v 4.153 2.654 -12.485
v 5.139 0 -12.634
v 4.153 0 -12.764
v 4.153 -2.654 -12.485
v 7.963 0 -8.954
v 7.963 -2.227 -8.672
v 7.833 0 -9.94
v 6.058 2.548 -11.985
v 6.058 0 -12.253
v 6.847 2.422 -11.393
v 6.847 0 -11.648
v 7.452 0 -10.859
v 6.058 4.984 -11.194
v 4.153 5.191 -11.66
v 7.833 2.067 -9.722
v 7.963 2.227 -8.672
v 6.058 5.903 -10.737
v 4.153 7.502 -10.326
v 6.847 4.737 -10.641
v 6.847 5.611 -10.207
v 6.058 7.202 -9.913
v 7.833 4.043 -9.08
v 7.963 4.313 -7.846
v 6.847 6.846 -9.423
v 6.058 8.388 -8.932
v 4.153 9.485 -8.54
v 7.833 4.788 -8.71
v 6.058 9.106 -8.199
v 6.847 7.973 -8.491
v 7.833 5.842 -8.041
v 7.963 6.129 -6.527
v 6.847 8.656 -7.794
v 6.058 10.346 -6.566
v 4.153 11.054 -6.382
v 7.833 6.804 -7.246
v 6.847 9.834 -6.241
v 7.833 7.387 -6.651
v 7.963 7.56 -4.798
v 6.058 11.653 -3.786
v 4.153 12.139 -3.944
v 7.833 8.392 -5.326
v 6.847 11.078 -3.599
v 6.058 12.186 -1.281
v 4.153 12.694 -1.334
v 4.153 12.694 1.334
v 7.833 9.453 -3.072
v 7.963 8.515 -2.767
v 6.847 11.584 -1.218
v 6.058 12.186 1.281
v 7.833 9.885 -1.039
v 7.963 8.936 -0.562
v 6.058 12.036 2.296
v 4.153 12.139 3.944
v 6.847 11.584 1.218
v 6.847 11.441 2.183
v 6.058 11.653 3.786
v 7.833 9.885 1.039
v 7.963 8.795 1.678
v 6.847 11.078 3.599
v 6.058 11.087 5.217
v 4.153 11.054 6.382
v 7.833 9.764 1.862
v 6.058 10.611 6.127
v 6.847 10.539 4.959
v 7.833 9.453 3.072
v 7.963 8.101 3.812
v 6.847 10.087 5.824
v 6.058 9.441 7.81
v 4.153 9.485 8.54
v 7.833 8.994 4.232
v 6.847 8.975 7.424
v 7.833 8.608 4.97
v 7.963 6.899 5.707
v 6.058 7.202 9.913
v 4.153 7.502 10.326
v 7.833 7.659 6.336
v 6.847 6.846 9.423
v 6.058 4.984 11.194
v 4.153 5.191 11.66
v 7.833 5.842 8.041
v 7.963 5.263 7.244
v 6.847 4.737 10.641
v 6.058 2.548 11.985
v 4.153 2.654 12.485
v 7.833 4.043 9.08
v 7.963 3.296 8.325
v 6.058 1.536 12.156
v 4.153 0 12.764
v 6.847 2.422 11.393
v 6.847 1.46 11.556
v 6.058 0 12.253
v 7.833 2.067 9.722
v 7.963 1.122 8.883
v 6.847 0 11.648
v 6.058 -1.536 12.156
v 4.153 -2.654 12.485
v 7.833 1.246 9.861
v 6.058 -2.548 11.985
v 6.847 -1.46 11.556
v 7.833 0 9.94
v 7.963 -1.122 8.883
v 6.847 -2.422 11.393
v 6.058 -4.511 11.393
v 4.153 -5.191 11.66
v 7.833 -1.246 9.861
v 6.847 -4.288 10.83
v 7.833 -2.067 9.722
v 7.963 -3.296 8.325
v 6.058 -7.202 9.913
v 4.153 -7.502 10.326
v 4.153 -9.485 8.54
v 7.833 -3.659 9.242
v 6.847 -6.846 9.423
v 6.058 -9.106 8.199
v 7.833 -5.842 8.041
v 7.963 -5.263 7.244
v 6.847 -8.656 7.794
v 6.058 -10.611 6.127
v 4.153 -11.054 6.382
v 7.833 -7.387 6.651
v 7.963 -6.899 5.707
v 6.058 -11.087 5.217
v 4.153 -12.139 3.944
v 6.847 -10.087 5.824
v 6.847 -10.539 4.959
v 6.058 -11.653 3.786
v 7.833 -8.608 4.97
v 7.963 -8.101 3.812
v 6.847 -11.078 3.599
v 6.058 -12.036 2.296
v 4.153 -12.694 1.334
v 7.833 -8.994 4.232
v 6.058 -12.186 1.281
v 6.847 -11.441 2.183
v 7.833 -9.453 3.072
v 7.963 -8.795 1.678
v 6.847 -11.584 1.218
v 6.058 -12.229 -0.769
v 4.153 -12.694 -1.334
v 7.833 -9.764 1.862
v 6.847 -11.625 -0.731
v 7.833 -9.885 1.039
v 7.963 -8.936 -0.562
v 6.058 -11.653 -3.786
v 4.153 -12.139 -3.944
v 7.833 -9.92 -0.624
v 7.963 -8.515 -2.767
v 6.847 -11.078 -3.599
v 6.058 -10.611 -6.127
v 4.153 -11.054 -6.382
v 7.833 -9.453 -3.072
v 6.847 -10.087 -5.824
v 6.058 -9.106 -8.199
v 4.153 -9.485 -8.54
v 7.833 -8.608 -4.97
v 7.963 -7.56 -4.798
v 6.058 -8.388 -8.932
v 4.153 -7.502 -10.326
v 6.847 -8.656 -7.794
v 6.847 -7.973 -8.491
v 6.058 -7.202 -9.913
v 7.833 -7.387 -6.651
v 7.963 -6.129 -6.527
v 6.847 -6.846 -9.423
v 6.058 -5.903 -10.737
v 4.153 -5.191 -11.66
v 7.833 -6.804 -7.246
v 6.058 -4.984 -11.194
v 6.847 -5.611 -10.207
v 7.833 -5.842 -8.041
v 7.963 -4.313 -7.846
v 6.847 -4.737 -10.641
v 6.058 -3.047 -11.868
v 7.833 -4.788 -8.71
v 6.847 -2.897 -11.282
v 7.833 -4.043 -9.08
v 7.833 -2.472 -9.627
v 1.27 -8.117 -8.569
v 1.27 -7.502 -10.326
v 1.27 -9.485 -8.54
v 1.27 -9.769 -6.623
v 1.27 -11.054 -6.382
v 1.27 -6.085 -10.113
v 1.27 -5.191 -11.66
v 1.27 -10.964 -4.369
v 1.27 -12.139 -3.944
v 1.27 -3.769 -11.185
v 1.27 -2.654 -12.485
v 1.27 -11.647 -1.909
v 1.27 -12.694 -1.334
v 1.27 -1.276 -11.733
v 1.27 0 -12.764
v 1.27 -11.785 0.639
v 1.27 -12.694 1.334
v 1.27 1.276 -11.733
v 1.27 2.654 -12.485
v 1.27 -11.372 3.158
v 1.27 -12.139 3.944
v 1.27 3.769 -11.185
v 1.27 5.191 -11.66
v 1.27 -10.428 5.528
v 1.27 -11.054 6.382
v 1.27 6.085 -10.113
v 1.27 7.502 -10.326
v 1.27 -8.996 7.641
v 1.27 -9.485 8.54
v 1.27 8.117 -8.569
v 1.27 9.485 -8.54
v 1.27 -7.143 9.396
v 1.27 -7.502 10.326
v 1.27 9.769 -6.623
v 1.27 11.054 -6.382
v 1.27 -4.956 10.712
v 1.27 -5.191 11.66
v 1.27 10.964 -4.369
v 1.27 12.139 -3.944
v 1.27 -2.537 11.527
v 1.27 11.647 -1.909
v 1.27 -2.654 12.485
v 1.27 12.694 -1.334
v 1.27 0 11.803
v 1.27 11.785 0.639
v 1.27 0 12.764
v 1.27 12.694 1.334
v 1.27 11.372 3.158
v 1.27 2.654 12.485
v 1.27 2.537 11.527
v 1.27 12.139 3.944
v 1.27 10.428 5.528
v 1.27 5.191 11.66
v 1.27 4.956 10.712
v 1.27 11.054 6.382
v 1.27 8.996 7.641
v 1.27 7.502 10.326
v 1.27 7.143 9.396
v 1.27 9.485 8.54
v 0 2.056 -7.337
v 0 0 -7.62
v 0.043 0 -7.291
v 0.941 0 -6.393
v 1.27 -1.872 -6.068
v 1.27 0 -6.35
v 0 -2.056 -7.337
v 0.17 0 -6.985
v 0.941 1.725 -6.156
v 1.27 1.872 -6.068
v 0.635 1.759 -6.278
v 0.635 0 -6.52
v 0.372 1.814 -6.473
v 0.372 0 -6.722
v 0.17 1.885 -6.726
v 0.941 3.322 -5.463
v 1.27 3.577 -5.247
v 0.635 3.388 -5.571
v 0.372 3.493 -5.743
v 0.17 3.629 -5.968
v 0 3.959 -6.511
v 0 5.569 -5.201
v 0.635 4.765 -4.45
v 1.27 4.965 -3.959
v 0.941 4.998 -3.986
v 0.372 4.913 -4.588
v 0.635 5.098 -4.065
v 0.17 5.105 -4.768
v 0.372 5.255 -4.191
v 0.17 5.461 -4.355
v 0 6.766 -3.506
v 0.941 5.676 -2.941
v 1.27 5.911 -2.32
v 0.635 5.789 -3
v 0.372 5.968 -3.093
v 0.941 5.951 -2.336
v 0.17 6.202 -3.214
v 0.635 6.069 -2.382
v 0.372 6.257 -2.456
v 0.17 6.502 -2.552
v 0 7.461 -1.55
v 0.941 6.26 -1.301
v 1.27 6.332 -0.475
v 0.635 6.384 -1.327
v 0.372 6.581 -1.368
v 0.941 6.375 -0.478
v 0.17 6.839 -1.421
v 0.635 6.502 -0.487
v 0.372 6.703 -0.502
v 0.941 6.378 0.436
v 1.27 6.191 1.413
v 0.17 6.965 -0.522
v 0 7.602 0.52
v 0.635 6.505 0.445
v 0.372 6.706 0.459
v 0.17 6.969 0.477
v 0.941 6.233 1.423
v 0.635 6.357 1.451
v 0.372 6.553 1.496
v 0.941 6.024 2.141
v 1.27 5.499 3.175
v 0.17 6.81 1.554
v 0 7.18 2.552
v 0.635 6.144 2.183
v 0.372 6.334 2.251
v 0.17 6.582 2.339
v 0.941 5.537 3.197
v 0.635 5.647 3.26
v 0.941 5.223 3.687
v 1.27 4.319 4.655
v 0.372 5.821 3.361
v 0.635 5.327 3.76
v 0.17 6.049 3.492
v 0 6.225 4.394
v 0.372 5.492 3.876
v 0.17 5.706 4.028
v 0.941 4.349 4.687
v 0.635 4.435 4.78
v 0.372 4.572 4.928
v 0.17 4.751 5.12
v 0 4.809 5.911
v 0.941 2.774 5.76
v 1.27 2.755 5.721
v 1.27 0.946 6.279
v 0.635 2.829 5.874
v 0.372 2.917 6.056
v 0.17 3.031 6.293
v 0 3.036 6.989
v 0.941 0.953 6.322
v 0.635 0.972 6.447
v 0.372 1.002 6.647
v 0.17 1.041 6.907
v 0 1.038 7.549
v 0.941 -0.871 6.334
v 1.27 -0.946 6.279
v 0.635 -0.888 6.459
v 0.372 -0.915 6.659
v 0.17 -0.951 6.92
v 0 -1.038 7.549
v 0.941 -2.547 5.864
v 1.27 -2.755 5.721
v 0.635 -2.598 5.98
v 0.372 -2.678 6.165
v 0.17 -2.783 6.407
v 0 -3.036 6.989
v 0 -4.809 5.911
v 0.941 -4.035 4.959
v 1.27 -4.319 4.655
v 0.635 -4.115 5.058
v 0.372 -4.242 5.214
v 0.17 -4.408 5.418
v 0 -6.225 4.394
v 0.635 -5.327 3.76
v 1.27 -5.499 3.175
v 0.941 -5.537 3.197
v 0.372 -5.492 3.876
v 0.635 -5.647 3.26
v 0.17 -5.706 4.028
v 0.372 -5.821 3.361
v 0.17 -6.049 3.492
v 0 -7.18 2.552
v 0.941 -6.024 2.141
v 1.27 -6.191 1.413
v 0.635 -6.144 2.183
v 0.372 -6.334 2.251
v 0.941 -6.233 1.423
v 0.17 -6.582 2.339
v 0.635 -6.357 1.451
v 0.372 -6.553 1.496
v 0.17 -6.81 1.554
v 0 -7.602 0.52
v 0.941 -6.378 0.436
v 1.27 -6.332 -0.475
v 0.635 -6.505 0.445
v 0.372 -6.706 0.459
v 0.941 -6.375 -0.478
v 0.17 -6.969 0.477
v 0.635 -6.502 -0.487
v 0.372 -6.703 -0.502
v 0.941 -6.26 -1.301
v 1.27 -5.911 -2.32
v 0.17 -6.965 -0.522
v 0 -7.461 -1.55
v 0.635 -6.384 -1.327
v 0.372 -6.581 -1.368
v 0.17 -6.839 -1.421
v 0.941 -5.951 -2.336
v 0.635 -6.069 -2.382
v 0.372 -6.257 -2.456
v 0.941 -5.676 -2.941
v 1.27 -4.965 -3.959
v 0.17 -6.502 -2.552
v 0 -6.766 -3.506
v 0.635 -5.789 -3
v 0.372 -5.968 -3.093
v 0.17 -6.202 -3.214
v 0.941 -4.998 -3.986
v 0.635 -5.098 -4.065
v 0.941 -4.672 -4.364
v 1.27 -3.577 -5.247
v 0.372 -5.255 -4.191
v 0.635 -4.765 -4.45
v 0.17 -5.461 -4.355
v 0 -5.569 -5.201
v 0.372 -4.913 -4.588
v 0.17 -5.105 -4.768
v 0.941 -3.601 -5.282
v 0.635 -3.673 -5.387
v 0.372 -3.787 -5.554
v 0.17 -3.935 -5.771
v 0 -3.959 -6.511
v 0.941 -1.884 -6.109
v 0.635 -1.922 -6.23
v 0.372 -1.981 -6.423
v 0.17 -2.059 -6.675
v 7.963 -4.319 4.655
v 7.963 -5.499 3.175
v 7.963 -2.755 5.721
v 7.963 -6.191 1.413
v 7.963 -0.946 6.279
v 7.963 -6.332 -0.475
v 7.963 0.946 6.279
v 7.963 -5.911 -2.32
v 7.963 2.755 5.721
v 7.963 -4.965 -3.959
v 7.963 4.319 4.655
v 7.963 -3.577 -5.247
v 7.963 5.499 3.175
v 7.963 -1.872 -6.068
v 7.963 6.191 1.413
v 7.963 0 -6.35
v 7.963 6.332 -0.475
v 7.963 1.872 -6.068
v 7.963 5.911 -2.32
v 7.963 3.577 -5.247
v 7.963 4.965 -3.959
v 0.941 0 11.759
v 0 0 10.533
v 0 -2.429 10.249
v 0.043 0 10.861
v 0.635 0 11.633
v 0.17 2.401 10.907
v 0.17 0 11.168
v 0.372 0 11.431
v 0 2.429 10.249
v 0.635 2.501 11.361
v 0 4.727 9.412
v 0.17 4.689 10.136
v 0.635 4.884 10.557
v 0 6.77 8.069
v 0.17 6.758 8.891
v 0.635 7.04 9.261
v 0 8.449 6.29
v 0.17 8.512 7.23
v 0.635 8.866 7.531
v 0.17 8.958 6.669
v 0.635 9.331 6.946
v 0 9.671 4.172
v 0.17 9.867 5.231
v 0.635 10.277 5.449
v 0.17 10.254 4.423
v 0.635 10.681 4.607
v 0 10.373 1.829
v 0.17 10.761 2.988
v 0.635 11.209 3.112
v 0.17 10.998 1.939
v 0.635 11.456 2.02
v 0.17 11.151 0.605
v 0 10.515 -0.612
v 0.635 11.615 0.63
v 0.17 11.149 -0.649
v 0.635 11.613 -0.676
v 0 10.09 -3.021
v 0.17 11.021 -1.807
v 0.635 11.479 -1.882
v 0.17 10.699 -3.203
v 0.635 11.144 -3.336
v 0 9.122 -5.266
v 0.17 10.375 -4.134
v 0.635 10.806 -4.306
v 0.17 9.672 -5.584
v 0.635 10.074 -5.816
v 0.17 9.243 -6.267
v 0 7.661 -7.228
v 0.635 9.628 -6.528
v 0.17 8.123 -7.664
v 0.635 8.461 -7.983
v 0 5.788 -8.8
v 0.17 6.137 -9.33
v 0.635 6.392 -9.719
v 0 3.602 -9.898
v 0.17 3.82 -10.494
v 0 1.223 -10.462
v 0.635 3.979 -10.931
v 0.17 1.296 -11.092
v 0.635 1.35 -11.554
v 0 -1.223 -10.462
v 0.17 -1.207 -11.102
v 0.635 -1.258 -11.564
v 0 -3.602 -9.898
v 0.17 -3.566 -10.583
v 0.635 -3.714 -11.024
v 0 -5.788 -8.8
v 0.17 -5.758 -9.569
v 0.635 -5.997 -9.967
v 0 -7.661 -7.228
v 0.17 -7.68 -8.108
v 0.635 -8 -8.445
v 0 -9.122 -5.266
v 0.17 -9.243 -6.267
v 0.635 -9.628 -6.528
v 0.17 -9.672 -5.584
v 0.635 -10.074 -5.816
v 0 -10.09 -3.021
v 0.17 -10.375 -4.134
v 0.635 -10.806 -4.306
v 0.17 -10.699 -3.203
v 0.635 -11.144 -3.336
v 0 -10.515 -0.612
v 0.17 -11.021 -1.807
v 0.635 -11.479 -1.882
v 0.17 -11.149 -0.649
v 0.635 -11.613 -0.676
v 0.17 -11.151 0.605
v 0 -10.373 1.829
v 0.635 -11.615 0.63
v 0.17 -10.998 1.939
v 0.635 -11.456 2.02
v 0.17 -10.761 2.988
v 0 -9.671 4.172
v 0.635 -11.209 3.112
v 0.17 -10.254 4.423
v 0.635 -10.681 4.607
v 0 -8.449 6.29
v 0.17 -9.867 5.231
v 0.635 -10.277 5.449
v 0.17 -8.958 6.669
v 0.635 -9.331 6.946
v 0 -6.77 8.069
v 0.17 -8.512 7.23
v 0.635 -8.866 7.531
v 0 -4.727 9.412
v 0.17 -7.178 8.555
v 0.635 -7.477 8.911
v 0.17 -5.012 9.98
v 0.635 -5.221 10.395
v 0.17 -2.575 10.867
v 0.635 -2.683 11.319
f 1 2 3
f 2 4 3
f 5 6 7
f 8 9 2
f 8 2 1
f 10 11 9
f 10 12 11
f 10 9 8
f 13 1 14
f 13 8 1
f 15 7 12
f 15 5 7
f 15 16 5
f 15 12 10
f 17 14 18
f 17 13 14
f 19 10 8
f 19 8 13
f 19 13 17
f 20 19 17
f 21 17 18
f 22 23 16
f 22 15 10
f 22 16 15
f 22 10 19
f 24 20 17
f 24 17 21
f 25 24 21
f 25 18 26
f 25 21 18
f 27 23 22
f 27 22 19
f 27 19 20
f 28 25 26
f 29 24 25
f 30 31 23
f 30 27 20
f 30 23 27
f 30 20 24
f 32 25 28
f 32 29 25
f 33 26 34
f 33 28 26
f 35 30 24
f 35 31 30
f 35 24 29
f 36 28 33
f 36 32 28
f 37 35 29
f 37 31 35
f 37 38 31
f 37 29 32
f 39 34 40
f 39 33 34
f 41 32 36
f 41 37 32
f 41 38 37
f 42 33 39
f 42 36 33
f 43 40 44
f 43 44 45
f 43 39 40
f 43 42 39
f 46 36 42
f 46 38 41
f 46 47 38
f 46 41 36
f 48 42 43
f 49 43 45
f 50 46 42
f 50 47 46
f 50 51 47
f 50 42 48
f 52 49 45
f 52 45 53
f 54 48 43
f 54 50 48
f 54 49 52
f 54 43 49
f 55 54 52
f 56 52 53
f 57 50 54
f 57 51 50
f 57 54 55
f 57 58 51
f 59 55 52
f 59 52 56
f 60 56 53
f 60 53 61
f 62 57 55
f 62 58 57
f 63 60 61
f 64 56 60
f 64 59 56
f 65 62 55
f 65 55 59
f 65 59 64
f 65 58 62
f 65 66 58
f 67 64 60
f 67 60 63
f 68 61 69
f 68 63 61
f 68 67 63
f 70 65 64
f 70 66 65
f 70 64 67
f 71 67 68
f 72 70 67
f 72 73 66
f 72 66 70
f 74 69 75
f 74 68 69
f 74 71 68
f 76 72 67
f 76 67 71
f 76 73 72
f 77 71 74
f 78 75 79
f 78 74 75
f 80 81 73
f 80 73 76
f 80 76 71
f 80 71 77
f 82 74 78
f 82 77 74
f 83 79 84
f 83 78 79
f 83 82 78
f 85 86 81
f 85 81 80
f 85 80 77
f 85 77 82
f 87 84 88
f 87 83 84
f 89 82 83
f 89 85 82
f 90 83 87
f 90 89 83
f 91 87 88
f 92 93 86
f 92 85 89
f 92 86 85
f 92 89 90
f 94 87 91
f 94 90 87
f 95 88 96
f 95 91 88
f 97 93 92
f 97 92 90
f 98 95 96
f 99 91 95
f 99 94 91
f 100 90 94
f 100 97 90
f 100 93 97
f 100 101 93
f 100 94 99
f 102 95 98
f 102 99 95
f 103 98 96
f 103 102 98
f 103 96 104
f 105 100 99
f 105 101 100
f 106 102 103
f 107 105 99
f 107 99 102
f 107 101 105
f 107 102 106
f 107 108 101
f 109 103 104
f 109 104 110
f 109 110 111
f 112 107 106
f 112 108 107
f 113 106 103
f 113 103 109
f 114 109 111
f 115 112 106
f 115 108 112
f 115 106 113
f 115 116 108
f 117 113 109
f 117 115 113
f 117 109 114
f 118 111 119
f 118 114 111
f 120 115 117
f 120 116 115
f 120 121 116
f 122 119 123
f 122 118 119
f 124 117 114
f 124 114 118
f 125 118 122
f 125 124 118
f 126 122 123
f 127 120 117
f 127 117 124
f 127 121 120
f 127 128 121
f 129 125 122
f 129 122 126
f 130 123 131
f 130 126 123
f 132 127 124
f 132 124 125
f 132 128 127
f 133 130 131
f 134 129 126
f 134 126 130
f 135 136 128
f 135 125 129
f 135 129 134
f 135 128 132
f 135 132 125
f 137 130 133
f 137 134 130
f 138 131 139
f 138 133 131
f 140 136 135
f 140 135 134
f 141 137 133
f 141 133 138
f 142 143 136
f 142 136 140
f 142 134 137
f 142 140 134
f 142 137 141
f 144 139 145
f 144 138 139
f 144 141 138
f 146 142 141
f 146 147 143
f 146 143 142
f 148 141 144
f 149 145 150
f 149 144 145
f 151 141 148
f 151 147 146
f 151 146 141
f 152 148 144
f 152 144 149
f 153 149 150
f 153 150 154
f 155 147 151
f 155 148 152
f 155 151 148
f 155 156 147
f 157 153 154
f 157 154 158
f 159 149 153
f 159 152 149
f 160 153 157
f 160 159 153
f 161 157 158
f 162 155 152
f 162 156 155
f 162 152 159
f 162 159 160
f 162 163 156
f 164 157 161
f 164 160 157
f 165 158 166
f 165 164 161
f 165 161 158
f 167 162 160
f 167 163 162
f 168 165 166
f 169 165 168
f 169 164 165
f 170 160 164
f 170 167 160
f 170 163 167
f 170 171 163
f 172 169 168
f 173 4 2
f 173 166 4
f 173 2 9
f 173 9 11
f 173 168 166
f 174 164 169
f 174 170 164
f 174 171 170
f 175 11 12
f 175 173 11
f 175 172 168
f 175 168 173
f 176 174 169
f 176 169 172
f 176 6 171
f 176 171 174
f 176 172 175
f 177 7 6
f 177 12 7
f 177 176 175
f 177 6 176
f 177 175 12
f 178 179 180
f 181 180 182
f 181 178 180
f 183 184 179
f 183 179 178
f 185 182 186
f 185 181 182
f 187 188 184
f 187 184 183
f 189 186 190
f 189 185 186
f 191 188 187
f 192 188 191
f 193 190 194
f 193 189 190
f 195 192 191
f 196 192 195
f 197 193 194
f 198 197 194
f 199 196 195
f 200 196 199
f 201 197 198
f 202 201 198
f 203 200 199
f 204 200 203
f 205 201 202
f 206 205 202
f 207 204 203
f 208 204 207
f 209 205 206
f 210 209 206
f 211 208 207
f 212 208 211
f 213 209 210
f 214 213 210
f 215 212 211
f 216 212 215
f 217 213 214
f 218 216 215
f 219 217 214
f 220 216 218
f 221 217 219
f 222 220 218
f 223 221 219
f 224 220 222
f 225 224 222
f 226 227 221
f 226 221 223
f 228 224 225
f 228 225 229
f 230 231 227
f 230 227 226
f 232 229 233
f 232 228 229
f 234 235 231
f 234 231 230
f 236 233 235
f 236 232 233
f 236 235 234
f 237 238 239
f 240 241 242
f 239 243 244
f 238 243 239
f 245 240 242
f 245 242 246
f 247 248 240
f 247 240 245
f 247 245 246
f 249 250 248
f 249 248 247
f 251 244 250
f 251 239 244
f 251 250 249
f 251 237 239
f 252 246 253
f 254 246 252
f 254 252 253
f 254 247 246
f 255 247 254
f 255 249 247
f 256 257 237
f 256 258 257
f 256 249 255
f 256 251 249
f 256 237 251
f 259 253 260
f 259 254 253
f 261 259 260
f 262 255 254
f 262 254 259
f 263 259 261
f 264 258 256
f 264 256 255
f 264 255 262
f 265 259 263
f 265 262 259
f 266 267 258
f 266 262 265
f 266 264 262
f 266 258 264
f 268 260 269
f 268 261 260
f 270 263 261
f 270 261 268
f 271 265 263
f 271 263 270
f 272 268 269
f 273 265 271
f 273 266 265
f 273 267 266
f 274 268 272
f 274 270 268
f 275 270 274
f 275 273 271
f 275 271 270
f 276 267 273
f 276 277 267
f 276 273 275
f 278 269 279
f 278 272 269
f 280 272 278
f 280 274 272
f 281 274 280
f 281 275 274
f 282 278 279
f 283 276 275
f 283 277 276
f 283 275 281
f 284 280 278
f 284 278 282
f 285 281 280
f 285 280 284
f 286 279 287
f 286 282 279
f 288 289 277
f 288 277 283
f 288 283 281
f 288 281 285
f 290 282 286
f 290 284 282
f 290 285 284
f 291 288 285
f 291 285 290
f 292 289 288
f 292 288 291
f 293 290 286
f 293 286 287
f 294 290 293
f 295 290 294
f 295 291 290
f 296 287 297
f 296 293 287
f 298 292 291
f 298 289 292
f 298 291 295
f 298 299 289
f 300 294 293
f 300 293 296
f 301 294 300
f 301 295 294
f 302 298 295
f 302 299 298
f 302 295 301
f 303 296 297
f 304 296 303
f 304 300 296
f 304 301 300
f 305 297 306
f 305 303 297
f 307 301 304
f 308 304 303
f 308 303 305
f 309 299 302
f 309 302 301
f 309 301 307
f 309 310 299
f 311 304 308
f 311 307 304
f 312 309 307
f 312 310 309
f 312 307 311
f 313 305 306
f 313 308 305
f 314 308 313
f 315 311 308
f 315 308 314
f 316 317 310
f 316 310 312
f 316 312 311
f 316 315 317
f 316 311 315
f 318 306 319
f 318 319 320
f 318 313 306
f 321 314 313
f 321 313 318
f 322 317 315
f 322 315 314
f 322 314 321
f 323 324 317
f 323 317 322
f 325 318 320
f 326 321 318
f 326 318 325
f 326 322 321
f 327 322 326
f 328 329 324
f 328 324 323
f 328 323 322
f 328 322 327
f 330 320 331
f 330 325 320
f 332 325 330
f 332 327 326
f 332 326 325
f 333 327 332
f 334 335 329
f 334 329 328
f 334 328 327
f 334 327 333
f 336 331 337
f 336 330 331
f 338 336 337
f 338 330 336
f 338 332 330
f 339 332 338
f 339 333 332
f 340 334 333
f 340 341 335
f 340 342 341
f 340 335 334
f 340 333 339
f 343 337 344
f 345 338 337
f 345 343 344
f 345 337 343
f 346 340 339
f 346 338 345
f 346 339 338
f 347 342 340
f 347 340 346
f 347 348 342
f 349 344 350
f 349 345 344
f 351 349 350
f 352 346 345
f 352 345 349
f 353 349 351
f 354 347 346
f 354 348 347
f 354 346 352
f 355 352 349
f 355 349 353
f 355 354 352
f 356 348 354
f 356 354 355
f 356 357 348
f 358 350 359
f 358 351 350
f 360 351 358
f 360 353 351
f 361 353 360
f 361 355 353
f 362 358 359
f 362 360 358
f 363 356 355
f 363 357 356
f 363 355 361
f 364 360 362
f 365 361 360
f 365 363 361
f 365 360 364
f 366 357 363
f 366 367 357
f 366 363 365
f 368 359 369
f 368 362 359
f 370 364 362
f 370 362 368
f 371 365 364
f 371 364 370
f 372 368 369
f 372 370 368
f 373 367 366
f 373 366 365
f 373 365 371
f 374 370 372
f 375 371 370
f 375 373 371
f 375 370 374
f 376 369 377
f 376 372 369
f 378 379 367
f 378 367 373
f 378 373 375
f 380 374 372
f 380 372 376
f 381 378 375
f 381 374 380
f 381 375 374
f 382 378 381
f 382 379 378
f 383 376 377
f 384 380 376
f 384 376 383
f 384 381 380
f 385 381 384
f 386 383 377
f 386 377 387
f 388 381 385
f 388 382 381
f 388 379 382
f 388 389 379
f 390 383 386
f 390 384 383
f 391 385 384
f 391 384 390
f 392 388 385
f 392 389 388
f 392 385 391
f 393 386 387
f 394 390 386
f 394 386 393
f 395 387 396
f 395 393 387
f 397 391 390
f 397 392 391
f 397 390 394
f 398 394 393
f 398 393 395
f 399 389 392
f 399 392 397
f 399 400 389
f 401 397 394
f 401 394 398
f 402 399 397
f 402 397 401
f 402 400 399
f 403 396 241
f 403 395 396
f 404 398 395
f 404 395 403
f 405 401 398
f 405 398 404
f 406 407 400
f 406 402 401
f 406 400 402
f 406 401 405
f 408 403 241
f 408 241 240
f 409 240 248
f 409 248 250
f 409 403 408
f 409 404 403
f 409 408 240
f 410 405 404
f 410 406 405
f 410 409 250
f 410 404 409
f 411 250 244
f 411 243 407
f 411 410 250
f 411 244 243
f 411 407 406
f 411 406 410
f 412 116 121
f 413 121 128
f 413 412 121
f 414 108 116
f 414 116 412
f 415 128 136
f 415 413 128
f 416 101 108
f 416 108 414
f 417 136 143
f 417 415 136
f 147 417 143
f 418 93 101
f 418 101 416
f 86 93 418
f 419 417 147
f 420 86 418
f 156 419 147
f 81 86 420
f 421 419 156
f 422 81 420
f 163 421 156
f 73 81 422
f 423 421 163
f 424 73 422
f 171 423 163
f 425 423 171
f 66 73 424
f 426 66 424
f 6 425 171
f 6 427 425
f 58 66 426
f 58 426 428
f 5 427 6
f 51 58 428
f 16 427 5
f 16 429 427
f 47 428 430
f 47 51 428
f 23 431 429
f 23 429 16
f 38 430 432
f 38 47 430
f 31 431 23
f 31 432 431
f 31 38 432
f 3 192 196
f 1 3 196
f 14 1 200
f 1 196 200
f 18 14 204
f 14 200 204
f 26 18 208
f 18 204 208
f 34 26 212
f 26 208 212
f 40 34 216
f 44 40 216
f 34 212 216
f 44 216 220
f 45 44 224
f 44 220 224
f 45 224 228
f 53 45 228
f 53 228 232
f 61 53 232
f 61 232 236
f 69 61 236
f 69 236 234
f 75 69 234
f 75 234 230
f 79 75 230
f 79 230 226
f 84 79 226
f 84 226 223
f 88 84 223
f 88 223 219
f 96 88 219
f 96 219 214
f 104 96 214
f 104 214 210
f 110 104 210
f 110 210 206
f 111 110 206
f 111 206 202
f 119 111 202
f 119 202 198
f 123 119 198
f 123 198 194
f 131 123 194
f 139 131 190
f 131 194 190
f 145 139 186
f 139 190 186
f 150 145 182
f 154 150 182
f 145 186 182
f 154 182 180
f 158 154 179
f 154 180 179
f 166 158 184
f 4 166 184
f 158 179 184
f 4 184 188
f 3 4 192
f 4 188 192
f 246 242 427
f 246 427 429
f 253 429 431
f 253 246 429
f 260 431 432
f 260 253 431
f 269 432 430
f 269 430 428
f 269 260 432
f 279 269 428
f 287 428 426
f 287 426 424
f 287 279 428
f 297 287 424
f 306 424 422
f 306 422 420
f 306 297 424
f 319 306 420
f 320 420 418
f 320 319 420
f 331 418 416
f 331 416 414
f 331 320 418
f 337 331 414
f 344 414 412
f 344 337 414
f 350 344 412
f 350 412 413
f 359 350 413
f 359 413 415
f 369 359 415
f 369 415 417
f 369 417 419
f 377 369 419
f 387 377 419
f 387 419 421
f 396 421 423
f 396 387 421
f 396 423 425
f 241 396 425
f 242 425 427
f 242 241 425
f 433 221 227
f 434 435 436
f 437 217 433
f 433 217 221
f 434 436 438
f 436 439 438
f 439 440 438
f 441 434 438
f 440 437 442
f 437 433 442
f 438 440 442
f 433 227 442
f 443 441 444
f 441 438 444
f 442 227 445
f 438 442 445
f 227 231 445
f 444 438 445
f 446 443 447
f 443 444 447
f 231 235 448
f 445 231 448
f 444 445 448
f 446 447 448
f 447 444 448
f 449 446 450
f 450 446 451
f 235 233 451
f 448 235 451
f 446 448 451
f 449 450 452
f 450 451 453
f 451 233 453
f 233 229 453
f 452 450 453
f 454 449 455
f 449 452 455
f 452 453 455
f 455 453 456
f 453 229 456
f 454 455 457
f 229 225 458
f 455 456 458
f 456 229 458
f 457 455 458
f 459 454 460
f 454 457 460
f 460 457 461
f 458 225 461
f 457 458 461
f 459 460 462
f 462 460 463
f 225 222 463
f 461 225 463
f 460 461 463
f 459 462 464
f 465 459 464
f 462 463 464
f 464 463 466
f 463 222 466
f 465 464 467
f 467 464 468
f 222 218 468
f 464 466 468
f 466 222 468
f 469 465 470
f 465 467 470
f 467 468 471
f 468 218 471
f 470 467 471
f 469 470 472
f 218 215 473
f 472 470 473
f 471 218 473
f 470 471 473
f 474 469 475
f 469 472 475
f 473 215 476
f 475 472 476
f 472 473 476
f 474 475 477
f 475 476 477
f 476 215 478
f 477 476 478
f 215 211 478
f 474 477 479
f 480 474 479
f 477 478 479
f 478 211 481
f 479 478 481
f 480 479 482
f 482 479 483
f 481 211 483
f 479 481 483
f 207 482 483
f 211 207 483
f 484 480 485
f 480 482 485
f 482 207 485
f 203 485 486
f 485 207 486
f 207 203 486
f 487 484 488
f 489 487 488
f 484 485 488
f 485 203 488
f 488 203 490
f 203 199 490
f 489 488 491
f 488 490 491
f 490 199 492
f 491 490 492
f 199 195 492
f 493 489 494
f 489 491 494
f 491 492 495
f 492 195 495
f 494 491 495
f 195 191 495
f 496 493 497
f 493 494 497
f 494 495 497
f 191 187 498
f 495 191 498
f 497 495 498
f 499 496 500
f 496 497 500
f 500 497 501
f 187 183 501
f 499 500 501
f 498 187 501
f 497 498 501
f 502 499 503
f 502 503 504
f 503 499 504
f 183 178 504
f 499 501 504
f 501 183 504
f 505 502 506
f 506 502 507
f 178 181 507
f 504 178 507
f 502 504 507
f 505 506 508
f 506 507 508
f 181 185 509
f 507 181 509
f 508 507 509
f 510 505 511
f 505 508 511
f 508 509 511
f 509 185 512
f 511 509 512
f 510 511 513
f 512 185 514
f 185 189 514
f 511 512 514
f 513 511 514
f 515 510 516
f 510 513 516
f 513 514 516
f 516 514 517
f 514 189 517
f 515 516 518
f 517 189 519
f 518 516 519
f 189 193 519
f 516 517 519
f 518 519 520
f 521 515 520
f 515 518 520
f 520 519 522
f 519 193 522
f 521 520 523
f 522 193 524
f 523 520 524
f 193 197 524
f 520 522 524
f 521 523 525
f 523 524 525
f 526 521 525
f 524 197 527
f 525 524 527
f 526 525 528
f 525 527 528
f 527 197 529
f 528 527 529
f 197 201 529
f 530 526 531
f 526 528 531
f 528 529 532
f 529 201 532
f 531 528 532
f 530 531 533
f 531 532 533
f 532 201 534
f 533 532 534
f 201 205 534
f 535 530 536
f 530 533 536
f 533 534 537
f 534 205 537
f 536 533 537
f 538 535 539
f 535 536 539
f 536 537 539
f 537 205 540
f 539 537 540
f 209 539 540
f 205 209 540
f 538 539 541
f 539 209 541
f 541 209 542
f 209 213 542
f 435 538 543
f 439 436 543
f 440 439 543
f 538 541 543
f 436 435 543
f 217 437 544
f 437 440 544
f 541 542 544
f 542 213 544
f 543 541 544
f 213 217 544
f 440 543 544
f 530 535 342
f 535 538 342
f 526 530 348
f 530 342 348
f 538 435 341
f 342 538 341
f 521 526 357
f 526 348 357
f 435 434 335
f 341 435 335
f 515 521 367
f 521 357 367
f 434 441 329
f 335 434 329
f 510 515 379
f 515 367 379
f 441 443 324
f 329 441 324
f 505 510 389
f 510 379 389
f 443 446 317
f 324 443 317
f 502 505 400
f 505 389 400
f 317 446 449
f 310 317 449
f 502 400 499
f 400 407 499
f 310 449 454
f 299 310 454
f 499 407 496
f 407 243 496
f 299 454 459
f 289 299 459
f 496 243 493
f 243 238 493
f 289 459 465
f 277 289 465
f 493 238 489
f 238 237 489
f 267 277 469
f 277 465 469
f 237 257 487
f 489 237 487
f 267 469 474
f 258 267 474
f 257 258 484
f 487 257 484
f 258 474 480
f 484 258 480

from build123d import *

# Parameters (mm, degrees)
SKETCH1_R           = 12.7635
SKETCH1_R_2         = 6.35
BOSS_EXTRUDE1_DEPTH = 7.9629
FILLET1_R           = 3.81
SKETCH2_R           = 12.7635
SKETCH2_R_2         = 11.802652822
CUT_EXTRUDE1_DEPTH  = 1.27
FILLET2_R           = 1.27


with BuildPart() as part:
    # Sketch1 → Boss-Extrude1 (new body)
    with BuildSketch(Plane(origin=(0, 0, 0), x_dir=(0, 0, -1), z_dir=(1, 0, 0))):
        Circle(SKETCH1_R)
        Circle(SKETCH1_R_2, mode=Mode.SUBTRACT)
    extrude(amount=BOSS_EXTRUDE1_DEPTH)

    # Fillet1
    fillet1_edges = [part.edges().sort_by_distance(p)[0] for p in [
        (7.9629, 0, 12.7635),
    ]]
    fillet(fillet1_edges, radius=FILLET1_R)

    # Sketch2 → Cut-Extrude1 (cut)
    with BuildSketch(Plane.ZY):
        Circle(SKETCH2_R)
        Circle(SKETCH2_R_2, mode=Mode.SUBTRACT)
    extrude(amount=-CUT_EXTRUDE1_DEPTH, mode=Mode.SUBTRACT)

    # Fillet2
    fillet2_edges = [part.edges().sort_by_distance(p)[0] for p in [
        (0, 0, -11.802652822),
        (0, 0, 6.35),
    ]]
    fillet(fillet2_edges, radius=FILLET2_R - 0.0001)  # a hair under: the kernel refuses the full size


solid = part.part
